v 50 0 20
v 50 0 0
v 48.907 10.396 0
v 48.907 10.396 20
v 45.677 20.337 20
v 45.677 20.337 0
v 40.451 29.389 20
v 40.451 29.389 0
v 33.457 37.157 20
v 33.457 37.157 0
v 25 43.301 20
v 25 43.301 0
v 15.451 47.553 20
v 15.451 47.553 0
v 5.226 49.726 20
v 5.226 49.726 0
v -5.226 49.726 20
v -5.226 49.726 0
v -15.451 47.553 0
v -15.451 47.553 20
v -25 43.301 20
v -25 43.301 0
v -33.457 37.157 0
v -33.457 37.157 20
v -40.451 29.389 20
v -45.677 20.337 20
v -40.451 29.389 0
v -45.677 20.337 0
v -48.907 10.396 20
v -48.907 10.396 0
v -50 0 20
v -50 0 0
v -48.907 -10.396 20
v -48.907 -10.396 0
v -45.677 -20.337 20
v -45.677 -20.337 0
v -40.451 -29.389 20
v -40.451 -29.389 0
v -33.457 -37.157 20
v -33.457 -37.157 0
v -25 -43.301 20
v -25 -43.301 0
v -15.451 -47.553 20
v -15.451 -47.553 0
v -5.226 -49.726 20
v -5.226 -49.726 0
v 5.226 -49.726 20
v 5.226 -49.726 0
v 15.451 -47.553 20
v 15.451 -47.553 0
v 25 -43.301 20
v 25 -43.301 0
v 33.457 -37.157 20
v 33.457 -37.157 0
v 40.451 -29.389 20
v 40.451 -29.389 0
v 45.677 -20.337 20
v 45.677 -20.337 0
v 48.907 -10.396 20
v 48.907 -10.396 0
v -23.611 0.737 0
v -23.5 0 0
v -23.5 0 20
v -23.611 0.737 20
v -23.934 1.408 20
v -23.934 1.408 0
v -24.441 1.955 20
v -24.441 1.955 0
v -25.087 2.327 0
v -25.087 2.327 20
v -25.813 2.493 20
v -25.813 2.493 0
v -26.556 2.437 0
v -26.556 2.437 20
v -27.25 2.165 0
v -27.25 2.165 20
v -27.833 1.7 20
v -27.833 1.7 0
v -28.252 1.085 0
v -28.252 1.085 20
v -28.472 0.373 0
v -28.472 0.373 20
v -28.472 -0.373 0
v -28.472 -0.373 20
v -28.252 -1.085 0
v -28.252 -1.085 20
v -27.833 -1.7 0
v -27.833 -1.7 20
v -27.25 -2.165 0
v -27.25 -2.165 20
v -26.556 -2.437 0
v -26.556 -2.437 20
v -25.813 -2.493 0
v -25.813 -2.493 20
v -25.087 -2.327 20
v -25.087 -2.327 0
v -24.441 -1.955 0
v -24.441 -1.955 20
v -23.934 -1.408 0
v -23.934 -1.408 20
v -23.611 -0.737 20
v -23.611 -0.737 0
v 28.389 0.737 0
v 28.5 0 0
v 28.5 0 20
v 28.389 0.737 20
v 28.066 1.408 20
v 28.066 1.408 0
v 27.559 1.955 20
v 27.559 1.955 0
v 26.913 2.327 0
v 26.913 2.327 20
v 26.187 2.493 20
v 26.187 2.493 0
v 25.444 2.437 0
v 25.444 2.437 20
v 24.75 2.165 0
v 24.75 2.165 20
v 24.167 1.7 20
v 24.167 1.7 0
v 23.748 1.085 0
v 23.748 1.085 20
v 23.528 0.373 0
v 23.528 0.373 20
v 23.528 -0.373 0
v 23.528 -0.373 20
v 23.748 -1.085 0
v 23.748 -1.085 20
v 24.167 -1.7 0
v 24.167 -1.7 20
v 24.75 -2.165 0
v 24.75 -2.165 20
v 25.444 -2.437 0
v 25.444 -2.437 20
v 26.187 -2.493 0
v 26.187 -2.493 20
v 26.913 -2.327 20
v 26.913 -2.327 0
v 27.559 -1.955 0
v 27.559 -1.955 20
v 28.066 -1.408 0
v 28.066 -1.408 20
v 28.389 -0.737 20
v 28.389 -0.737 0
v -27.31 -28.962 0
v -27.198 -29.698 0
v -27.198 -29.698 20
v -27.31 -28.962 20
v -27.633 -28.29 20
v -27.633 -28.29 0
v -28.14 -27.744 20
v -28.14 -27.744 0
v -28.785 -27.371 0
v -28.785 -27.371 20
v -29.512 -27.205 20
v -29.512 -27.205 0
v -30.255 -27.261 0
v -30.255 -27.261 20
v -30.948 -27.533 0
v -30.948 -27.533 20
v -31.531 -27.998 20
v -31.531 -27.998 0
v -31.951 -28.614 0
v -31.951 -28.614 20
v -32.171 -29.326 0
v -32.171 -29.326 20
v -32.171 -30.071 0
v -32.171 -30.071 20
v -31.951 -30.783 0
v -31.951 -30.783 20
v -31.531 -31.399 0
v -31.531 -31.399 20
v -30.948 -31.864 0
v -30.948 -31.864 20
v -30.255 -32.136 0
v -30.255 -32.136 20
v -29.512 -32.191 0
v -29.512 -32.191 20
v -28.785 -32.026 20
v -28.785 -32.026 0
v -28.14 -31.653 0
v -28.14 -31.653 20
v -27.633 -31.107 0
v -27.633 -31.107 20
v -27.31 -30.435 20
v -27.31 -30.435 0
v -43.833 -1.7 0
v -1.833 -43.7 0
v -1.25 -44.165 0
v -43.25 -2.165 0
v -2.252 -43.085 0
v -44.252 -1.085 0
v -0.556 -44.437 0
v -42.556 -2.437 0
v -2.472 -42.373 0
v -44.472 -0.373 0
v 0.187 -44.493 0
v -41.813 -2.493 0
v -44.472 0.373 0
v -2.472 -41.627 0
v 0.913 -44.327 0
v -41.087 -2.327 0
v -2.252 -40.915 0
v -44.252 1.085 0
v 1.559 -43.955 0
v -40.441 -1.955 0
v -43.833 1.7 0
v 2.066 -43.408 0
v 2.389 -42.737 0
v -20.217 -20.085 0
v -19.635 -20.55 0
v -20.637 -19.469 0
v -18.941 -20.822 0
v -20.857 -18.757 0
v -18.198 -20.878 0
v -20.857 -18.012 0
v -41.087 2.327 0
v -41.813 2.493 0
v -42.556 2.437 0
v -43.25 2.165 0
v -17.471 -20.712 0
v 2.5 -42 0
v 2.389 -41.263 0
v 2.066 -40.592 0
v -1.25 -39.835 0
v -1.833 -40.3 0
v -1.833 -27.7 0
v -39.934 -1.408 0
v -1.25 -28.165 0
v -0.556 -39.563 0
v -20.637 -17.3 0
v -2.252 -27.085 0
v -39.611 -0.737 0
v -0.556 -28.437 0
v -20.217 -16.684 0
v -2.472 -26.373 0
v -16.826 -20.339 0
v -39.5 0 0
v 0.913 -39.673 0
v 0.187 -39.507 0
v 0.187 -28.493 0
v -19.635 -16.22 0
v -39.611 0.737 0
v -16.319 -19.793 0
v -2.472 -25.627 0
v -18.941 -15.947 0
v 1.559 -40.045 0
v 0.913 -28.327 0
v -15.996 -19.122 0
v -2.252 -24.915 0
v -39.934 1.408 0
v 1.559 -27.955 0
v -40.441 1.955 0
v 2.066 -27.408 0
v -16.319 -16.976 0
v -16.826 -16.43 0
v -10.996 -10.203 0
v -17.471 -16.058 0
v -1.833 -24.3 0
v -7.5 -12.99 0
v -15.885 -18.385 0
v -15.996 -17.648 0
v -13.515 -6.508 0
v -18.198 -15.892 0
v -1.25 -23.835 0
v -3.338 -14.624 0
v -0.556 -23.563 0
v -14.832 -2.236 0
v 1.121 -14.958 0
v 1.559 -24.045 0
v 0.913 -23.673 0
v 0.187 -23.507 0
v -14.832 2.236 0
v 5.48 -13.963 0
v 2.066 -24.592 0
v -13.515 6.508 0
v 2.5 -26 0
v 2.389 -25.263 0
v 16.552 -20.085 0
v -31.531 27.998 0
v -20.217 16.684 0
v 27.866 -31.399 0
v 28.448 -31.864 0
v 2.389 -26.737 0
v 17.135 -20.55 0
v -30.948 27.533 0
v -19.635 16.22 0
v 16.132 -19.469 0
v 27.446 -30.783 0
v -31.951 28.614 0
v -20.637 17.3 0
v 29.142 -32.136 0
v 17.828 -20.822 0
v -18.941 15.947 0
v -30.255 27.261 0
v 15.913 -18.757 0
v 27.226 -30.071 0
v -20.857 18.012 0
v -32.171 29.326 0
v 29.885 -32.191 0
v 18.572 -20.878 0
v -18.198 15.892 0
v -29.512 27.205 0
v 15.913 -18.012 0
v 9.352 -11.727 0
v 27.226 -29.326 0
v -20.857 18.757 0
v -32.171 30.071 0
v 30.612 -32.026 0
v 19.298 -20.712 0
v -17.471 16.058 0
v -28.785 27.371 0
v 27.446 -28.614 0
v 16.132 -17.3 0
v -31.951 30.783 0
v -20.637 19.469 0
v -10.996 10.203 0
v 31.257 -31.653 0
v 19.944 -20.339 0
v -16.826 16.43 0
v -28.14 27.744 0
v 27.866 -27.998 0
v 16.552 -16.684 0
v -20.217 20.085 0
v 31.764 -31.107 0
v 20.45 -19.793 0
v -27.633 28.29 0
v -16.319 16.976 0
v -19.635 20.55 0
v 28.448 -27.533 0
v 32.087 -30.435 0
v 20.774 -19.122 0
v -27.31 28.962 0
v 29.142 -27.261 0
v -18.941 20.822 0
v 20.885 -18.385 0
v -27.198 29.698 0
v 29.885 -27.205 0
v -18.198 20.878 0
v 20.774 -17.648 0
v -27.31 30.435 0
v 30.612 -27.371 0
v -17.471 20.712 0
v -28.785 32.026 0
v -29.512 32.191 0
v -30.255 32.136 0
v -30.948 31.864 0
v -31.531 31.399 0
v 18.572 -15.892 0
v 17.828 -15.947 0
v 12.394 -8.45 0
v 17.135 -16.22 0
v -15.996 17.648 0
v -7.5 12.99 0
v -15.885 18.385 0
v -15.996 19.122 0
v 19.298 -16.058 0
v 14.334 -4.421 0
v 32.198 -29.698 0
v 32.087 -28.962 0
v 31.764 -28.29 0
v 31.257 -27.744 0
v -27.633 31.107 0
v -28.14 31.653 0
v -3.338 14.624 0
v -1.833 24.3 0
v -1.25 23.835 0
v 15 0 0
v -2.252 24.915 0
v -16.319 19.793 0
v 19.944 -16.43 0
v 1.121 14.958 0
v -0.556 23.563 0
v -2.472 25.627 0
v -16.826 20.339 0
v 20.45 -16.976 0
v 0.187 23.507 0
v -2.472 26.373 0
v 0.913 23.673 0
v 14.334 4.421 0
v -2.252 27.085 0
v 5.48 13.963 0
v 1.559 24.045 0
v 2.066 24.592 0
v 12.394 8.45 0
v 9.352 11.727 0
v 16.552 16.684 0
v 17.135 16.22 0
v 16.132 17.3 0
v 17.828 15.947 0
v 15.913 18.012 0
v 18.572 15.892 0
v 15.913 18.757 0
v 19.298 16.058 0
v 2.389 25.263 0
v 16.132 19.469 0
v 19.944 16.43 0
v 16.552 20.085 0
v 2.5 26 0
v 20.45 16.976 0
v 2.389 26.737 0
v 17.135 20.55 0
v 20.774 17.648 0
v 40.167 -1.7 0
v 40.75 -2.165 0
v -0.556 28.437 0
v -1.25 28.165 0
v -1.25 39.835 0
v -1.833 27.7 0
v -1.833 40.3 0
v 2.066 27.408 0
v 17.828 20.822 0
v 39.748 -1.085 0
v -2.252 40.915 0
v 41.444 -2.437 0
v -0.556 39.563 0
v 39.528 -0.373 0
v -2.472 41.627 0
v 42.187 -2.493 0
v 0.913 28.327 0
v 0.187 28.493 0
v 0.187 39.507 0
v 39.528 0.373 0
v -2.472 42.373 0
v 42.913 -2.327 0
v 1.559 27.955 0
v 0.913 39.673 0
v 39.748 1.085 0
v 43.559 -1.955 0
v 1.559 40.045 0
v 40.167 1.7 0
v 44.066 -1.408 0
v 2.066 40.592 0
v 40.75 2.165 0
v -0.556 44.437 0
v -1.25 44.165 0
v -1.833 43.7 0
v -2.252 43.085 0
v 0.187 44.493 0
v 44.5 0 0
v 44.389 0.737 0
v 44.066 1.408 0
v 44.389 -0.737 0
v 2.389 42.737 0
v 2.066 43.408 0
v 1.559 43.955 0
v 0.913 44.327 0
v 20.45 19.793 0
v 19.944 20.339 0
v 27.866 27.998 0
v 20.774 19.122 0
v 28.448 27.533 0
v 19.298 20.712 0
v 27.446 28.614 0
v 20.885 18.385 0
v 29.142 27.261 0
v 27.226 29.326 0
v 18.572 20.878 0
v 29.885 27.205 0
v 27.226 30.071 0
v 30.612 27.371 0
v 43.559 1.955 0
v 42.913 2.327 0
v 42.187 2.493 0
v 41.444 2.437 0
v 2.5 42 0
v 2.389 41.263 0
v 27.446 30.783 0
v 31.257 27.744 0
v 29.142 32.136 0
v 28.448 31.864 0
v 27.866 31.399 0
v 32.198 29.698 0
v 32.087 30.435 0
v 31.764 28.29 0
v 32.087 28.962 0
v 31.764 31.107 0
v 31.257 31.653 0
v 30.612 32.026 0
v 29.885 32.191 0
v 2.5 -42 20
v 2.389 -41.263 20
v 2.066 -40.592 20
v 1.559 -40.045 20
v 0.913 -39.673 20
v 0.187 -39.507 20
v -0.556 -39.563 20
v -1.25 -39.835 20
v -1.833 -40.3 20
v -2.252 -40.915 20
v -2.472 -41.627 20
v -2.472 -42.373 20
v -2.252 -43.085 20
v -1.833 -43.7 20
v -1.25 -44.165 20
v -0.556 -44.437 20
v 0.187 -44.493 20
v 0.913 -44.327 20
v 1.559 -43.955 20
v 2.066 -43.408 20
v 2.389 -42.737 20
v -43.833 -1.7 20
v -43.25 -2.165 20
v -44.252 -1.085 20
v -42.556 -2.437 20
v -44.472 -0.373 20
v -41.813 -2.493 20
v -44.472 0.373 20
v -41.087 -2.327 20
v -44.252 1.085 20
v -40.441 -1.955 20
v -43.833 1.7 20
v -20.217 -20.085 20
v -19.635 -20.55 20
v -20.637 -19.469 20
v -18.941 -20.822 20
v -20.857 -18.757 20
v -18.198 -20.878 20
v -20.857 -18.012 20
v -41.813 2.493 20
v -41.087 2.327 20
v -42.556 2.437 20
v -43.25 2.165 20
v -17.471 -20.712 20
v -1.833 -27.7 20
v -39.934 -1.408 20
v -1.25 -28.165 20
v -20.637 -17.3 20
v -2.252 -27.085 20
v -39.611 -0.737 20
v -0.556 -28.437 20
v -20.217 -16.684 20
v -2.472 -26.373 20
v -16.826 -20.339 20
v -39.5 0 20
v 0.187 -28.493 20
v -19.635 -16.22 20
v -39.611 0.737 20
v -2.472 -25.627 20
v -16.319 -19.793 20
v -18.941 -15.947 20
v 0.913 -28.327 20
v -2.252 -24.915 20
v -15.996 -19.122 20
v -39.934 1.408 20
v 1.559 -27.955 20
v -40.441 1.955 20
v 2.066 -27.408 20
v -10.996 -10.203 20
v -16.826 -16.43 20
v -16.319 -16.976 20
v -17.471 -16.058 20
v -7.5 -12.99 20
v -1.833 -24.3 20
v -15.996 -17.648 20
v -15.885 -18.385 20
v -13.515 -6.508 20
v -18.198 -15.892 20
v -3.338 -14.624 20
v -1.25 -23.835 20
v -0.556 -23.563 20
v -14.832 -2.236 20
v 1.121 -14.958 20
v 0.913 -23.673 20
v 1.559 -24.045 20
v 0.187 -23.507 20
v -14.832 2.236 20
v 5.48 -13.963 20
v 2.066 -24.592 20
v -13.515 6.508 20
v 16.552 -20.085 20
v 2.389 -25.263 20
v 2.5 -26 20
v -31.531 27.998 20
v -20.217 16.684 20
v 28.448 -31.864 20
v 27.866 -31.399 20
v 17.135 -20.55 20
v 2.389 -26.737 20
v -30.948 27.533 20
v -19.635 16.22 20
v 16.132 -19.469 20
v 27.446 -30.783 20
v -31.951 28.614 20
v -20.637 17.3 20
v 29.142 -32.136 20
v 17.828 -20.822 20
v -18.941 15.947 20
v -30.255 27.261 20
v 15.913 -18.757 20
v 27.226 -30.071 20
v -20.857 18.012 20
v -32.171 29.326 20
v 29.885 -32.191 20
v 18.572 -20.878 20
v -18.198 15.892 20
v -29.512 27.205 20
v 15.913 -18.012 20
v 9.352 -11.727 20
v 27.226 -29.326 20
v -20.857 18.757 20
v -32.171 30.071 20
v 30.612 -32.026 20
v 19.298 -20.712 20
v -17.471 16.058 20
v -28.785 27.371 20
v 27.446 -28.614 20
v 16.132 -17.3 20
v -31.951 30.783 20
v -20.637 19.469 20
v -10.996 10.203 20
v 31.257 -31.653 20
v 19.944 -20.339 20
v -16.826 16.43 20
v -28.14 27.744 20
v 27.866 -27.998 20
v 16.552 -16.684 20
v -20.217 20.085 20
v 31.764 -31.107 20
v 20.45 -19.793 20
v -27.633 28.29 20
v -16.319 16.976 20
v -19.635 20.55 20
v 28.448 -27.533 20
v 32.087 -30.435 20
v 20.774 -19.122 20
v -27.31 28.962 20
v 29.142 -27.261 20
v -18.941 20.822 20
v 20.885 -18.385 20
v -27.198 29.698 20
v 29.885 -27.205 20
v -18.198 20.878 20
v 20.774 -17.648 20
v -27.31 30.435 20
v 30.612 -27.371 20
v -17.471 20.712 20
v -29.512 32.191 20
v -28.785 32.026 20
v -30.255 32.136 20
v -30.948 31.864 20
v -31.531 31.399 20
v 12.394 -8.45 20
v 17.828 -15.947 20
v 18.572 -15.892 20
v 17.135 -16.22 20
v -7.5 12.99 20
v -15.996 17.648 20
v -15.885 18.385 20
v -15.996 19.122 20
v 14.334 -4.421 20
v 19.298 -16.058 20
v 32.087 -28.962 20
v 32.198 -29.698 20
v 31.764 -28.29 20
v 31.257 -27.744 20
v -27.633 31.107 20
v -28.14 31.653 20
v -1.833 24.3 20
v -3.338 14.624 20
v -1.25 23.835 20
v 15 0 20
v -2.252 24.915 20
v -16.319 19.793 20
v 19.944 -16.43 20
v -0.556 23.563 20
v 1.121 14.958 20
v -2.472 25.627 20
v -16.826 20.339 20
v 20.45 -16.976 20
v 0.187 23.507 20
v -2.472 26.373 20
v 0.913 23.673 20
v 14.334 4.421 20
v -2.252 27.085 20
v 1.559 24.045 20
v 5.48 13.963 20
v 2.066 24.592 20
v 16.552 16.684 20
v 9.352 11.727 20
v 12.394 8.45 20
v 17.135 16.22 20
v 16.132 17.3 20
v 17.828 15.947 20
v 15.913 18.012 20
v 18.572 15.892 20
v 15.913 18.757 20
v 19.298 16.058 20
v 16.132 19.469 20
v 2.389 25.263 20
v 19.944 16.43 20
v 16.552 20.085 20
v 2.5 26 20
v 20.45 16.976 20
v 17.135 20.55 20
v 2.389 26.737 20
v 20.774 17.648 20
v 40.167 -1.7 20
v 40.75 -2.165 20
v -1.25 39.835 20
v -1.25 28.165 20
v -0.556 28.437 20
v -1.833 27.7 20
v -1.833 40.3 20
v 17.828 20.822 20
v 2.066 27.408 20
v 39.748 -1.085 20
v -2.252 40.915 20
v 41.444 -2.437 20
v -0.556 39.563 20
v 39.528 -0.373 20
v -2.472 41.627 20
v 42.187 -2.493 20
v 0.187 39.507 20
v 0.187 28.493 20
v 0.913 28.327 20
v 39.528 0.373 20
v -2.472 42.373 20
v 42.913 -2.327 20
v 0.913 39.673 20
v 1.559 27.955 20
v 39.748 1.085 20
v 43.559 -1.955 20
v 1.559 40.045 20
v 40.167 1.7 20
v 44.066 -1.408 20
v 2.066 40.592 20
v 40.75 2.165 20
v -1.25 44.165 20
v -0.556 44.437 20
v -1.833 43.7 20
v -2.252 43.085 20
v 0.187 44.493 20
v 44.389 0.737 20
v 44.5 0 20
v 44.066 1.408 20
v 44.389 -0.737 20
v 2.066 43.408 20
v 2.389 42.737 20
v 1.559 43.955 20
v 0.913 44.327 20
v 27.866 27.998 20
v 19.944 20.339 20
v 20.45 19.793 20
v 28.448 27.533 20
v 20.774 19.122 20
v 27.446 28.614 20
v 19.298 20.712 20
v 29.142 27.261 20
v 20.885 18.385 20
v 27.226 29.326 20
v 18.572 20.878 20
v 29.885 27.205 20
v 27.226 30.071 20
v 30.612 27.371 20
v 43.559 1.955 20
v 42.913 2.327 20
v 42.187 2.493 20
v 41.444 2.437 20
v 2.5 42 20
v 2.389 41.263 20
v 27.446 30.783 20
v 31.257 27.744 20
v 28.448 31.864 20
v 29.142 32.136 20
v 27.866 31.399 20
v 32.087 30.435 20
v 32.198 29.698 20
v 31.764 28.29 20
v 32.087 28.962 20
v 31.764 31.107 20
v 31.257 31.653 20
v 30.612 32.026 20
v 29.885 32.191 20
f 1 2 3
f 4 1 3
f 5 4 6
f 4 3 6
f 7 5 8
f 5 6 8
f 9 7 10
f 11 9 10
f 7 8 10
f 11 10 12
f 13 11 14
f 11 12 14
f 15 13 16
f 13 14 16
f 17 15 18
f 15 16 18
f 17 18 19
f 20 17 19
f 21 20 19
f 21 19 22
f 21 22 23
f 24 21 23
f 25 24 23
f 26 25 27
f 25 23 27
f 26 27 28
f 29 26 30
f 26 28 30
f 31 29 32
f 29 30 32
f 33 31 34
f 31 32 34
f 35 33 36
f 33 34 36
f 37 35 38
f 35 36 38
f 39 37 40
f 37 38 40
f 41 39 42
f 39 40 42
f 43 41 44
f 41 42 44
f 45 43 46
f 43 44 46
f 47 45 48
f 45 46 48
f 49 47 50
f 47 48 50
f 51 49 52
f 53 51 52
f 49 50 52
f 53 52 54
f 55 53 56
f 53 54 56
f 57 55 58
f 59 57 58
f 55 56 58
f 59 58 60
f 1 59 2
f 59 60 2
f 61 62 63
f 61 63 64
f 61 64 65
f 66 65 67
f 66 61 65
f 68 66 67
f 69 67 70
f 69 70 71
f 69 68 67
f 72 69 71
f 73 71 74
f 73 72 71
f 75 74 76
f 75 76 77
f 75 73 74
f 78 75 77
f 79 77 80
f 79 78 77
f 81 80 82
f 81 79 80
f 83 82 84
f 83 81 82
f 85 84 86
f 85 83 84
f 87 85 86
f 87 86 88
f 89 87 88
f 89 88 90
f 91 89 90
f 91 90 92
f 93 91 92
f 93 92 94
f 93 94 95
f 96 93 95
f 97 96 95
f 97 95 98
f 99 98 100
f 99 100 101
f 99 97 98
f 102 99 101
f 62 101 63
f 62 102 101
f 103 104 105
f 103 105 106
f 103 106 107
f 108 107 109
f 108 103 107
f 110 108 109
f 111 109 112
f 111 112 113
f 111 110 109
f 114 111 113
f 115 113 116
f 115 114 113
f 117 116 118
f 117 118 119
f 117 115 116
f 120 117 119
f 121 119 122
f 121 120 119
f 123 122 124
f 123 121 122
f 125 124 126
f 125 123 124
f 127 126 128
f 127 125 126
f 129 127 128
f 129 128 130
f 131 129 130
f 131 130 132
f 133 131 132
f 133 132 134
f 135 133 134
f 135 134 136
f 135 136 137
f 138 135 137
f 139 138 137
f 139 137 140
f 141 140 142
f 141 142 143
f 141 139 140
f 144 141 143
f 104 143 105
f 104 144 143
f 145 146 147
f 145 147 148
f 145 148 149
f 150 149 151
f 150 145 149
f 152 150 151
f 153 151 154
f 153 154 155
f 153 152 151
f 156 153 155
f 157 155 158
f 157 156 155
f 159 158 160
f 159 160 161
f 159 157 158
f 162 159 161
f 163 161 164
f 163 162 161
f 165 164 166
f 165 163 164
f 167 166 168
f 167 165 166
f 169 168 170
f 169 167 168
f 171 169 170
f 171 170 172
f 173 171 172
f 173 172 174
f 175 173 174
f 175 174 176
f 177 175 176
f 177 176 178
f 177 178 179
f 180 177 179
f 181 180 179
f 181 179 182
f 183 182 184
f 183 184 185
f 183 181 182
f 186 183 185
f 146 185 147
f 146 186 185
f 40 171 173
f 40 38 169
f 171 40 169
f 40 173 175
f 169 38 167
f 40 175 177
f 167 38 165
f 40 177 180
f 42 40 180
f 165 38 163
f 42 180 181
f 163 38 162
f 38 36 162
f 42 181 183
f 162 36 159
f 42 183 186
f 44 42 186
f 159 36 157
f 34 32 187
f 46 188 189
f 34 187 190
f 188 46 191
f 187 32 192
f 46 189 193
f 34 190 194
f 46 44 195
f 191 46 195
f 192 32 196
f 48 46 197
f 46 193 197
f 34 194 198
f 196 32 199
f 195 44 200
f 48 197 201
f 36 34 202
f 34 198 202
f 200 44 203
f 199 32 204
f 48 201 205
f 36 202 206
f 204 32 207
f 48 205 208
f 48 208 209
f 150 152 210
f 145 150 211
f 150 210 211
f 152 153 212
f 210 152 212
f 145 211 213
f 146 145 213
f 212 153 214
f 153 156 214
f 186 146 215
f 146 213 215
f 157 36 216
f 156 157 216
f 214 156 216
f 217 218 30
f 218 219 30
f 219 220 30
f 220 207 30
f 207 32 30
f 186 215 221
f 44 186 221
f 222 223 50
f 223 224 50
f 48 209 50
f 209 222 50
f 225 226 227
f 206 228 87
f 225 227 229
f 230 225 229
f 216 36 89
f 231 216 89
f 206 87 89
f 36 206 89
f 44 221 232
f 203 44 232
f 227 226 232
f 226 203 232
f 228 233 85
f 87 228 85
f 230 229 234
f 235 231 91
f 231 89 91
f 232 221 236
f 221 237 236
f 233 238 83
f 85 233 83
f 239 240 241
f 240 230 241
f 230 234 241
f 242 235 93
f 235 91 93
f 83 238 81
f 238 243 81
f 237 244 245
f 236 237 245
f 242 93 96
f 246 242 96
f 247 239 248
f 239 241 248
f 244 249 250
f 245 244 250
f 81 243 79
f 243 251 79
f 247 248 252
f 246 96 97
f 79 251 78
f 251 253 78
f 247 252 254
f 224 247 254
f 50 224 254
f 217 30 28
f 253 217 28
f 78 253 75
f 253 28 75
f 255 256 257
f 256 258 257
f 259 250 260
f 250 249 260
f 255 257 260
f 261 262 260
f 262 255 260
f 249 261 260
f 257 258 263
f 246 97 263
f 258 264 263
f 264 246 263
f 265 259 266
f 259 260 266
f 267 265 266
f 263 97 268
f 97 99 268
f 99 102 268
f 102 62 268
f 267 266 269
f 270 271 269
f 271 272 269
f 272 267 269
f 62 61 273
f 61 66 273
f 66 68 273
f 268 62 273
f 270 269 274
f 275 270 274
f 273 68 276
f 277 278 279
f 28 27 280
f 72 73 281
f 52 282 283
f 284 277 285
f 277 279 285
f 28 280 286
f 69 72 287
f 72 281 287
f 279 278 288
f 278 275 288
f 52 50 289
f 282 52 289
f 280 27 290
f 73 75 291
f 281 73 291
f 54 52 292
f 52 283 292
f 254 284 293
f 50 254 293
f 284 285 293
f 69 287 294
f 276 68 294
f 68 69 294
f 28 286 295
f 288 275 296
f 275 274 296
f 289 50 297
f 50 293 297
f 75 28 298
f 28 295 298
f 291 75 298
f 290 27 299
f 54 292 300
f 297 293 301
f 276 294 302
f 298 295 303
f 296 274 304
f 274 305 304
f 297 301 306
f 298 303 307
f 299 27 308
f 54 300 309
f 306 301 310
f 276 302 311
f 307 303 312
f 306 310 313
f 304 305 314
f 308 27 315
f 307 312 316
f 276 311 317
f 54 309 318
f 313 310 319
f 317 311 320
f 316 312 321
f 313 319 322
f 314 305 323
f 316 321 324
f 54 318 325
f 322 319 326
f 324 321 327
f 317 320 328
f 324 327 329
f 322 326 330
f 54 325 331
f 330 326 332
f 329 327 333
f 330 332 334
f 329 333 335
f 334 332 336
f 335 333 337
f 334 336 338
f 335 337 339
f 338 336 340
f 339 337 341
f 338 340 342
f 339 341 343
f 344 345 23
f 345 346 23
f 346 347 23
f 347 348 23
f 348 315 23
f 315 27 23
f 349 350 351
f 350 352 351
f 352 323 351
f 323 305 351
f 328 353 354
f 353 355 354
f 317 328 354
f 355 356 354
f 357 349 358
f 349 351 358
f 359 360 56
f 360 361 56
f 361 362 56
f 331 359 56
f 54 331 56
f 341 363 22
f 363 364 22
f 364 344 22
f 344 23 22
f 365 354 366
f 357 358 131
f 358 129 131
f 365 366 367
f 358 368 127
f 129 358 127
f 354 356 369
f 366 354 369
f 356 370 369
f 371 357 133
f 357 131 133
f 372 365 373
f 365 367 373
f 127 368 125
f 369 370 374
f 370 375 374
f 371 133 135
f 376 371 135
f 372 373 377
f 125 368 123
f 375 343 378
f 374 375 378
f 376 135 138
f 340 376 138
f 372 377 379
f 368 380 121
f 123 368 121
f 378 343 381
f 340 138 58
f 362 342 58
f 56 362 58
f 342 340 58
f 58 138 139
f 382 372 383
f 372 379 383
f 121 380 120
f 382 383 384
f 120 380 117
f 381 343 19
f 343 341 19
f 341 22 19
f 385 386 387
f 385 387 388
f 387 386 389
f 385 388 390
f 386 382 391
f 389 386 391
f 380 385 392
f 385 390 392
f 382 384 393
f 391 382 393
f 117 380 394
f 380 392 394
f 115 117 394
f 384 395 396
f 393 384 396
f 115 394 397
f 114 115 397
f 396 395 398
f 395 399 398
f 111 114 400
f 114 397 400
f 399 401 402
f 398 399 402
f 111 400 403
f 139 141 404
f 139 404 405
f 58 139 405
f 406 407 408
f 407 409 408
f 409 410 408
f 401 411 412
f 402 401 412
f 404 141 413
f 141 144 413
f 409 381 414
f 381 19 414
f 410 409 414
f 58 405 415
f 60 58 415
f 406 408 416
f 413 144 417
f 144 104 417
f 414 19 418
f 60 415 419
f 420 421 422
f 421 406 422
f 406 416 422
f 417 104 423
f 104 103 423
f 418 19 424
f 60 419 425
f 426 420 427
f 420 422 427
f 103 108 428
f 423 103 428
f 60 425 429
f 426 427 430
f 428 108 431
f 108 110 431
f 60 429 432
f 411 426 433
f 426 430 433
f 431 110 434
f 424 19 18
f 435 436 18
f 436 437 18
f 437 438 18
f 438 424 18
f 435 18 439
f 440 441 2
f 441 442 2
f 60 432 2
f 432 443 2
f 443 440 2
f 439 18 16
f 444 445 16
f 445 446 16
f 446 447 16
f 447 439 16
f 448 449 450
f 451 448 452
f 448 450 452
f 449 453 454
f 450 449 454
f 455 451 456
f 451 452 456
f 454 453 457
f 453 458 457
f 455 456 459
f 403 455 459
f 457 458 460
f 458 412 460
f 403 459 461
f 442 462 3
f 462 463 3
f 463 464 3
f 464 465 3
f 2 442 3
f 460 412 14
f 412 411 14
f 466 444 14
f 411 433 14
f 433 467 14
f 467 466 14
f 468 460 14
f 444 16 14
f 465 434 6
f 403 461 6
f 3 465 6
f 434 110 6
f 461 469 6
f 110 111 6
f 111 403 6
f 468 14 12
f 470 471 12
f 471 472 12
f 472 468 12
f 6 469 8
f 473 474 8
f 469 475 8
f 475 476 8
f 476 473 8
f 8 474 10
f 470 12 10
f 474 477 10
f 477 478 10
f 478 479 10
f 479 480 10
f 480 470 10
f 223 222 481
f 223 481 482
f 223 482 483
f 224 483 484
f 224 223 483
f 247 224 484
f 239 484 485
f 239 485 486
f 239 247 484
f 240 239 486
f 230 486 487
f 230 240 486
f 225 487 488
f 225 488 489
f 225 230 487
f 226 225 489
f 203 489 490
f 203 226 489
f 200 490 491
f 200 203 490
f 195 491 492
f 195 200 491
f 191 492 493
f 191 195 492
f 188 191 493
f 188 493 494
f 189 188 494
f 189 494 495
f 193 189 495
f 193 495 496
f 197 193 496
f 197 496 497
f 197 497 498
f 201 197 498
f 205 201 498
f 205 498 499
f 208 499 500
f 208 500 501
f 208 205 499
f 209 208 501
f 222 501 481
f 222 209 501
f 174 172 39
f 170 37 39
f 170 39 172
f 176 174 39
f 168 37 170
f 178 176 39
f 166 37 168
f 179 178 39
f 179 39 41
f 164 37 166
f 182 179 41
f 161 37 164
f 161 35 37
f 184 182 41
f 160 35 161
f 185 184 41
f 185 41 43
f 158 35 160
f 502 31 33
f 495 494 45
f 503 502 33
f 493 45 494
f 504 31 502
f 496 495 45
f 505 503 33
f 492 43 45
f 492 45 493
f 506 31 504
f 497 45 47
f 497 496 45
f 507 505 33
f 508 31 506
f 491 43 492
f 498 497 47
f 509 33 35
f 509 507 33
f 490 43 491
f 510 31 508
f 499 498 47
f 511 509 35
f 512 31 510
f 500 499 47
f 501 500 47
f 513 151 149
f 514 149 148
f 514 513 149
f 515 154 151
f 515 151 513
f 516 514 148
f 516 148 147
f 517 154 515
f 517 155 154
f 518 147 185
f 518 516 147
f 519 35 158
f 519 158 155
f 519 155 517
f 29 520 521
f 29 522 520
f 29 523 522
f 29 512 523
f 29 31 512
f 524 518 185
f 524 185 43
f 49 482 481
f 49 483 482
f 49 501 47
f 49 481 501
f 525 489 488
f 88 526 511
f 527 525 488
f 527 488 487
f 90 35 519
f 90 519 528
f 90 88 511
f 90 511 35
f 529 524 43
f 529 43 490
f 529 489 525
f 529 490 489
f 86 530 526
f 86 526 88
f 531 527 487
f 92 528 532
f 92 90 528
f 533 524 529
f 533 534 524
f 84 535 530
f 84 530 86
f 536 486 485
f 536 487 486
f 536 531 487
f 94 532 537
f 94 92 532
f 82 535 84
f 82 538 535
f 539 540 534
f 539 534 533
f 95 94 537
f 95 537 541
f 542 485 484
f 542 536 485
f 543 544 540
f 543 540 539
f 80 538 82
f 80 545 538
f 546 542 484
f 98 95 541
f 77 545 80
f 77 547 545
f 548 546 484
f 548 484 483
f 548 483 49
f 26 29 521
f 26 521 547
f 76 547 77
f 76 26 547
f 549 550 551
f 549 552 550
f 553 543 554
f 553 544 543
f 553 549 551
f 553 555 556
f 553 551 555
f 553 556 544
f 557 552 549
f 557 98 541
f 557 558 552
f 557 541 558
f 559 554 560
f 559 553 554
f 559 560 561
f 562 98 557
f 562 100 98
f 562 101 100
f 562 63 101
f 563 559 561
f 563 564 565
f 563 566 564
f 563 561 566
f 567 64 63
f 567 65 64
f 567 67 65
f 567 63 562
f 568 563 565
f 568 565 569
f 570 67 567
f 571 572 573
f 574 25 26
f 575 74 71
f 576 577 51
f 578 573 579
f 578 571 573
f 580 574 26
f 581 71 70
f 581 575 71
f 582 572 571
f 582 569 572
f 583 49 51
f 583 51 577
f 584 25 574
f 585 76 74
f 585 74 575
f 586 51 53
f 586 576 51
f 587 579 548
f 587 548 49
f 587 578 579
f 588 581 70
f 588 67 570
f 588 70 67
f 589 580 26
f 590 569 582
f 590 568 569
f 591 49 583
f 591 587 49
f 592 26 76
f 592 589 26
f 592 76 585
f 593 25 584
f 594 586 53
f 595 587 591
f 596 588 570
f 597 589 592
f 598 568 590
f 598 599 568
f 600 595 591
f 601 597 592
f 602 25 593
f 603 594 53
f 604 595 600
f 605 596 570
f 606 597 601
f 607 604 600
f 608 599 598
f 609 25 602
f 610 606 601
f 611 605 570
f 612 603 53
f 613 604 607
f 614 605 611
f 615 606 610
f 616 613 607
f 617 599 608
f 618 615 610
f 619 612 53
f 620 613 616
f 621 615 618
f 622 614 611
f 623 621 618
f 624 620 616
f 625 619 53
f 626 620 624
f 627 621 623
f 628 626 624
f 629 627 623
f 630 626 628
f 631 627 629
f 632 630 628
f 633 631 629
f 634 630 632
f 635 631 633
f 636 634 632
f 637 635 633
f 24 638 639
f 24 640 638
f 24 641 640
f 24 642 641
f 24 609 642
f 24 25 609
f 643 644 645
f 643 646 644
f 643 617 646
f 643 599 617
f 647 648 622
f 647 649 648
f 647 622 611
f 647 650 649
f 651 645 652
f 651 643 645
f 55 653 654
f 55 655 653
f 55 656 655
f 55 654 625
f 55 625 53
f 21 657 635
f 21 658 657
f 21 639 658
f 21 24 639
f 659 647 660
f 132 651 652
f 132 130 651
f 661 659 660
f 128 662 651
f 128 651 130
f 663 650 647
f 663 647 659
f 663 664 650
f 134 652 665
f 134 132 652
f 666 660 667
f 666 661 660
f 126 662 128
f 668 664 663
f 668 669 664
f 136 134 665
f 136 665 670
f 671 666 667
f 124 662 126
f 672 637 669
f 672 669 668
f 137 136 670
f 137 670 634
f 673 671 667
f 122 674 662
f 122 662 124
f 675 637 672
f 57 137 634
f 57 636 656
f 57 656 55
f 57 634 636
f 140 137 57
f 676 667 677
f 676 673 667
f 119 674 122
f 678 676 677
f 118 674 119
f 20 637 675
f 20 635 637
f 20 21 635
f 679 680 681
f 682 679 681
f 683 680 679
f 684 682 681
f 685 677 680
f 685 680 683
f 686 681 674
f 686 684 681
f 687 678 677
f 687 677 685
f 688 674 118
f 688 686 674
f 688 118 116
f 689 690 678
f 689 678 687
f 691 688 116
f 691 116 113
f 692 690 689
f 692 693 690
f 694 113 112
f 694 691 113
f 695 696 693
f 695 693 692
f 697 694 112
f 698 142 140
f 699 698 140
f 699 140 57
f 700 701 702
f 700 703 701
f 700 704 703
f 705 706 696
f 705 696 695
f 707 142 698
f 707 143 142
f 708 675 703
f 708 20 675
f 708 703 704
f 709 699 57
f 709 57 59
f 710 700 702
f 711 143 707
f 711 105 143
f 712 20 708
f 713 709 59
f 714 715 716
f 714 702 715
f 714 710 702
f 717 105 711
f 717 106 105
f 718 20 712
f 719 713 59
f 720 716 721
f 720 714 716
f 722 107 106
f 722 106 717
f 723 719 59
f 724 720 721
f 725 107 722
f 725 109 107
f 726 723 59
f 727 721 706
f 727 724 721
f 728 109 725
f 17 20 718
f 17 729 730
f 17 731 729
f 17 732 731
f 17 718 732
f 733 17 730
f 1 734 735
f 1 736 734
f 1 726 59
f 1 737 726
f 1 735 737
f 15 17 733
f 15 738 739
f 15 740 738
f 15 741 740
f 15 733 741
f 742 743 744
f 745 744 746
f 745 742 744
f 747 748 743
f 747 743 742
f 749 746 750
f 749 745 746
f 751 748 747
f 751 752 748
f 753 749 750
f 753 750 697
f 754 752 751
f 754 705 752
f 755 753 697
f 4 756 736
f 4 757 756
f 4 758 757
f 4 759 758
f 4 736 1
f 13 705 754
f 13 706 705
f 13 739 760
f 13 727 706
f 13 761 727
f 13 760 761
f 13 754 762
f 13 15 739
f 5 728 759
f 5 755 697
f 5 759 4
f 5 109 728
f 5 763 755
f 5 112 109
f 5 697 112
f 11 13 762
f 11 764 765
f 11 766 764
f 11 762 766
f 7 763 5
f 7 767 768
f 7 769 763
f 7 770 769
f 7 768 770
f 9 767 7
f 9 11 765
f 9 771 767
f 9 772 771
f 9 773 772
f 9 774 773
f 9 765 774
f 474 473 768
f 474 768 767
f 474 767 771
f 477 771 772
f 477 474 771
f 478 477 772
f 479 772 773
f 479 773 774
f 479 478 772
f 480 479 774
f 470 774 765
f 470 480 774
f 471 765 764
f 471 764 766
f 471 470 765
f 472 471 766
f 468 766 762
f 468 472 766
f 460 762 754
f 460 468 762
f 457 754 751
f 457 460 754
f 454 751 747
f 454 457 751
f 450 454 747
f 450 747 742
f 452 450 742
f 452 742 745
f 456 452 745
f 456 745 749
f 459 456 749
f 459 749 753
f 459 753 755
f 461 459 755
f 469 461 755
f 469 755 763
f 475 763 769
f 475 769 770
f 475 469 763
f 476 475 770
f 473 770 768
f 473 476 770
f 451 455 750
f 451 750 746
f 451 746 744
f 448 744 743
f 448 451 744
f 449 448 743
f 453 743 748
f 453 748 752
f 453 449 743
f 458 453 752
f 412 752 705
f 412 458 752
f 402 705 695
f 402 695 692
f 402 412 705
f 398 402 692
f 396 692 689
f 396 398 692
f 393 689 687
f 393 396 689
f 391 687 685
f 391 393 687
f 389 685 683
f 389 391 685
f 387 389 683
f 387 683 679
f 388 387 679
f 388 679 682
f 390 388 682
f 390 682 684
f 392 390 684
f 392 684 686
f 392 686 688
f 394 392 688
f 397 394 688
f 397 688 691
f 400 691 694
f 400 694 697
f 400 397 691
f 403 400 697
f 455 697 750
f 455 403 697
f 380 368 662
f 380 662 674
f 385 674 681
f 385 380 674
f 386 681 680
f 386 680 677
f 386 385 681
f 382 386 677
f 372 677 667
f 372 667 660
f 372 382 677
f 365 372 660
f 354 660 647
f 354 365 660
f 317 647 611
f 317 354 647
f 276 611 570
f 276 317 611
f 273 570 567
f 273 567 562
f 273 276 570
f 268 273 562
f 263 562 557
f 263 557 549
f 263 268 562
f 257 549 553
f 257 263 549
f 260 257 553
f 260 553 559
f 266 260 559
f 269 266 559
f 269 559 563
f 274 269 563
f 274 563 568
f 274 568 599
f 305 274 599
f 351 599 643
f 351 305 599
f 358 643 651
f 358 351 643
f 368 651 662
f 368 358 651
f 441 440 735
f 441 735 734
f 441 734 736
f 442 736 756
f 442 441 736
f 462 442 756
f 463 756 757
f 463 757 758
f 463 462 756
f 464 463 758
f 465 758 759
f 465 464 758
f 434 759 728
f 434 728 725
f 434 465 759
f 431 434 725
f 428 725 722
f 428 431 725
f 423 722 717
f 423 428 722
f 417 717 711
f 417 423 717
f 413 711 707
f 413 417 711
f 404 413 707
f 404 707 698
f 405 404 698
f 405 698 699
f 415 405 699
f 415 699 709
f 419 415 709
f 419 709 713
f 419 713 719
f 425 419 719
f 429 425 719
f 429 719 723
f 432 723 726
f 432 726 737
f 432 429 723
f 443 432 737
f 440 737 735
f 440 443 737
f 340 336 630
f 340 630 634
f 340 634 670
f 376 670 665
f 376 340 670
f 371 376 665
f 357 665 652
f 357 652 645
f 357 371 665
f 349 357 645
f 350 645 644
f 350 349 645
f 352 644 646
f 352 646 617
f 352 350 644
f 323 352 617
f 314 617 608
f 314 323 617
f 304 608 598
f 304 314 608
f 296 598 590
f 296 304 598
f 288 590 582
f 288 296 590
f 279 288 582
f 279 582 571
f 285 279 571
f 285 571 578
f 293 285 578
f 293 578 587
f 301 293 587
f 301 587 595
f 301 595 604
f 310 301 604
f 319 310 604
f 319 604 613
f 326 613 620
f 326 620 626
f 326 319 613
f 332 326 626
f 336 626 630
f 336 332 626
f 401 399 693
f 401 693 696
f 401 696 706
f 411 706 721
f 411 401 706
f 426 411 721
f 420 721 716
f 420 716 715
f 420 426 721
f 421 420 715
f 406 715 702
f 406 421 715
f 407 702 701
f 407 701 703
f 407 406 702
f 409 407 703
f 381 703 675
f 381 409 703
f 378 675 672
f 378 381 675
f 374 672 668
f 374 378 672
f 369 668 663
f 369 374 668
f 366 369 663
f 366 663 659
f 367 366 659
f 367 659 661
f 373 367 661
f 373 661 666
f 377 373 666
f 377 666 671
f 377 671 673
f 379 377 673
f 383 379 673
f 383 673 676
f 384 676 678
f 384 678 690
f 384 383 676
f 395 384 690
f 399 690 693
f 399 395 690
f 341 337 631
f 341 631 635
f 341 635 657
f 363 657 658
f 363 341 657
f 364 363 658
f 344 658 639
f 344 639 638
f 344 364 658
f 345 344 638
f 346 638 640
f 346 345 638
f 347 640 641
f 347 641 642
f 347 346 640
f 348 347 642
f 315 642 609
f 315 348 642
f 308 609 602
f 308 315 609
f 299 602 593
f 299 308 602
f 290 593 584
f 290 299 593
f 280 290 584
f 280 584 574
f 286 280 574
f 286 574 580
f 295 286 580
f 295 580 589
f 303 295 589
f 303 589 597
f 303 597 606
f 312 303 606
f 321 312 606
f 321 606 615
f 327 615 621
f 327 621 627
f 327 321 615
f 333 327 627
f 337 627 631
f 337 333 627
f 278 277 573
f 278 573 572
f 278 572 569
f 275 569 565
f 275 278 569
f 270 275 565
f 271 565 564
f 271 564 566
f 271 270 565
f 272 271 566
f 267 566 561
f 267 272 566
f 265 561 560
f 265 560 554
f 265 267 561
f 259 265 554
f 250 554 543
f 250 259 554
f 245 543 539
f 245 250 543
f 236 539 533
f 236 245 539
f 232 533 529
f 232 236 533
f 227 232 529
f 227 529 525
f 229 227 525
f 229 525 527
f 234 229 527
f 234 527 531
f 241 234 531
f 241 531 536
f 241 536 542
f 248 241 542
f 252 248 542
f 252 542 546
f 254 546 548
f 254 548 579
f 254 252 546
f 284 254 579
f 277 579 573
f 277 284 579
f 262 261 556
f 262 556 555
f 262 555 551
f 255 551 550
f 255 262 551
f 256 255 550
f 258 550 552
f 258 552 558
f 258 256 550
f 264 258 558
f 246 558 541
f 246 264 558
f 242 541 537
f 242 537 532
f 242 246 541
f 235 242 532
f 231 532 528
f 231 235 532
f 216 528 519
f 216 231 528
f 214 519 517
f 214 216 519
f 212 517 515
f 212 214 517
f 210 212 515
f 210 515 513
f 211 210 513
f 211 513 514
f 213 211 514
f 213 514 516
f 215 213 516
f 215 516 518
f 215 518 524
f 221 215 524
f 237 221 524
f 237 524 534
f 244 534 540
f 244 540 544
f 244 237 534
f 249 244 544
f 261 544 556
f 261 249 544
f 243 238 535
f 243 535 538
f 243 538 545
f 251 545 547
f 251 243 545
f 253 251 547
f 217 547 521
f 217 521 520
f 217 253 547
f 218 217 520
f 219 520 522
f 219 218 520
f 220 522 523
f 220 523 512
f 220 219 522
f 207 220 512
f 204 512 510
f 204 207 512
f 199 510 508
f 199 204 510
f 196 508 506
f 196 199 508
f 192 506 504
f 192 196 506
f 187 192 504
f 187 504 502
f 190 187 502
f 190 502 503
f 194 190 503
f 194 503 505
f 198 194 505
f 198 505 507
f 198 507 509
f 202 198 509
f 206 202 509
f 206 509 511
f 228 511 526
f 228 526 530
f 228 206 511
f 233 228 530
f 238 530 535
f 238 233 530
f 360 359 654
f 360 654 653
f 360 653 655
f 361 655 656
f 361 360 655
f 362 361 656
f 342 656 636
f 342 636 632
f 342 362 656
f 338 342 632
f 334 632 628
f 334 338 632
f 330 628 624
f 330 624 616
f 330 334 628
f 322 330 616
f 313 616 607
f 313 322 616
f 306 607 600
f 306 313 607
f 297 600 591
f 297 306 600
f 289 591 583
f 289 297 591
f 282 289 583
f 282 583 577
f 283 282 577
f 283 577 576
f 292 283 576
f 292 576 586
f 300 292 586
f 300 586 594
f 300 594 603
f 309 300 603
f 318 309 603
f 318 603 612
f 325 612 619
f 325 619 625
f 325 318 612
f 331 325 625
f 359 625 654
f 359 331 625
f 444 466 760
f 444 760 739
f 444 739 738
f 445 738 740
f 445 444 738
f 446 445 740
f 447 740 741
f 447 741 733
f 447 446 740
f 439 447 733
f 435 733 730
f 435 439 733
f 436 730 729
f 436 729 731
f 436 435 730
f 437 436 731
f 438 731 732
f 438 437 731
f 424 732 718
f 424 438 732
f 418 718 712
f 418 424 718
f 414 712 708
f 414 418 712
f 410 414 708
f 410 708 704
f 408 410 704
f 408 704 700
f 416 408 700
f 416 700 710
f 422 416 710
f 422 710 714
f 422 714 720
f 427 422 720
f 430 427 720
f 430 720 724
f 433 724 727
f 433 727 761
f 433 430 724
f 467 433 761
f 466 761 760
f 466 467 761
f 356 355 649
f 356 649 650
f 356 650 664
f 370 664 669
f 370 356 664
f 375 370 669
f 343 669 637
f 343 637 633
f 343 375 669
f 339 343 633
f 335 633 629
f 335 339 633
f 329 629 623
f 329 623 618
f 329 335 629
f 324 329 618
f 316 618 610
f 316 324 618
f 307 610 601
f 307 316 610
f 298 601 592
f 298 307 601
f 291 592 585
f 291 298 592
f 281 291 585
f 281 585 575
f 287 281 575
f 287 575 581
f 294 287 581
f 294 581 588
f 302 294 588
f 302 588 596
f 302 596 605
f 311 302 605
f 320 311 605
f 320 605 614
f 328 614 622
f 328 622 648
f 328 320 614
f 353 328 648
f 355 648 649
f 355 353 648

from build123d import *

# Parameters (mm, degrees)
F0_R     = 50
F0_R_2   = 2.5
F0_R_3   = 15
F1_DEPTH = 20


with BuildPart() as f1:
    # F0 (on Top) → F1 (new body)
    with BuildSketch(Plane.XY):
        Circle(F0_R)
        with Locations((-29.698485, -29.698485)):
            Circle(F0_R_2, mode=Mode.SUBTRACT)
        with Locations((-18.384776, -18.384776)):
            Circle(F0_R_2, mode=Mode.SUBTRACT)
        with Locations((0, -42)):
            Circle(F0_R_2, mode=Mode.SUBTRACT)
        with Locations((0, -26)):
            Circle(F0_R_2, mode=Mode.SUBTRACT)
        with Locations((29.698485, -29.698485)):
            Circle(F0_R_2, mode=Mode.SUBTRACT)
        with Locations((18.384776, -18.384776)):
            Circle(F0_R_2, mode=Mode.SUBTRACT)
        with Locations((-42, 0)):
            Circle(F0_R_2, mode=Mode.SUBTRACT)
        with Locations((-26, 0)):
            Circle(F0_R_2, mode=Mode.SUBTRACT)
        with Locations((-18.384776, 18.384776)):
            Circle(F0_R_2, mode=Mode.SUBTRACT)
        with Locations((-29.698485, 29.698485)):
            Circle(F0_R_2, mode=Mode.SUBTRACT)
        Circle(F0_R_3, mode=Mode.SUBTRACT)
        with Locations((18.384776, 18.384776)):
            Circle(F0_R_2, mode=Mode.SUBTRACT)
        with Locations((26, 0)):
            Circle(F0_R_2, mode=Mode.SUBTRACT)
        with Locations((42, 0)):
            Circle(F0_R_2, mode=Mode.SUBTRACT)
        with Locations((0, 26)):
            Circle(F0_R_2, mode=Mode.SUBTRACT)
        with Locations((0, 42)):
            Circle(F0_R_2, mode=Mode.SUBTRACT)
        with Locations((29.698485, 29.698485)):
            Circle(F0_R_2, mode=Mode.SUBTRACT)
    extrude(amount=F1_DEPTH)


solid = f1.part
